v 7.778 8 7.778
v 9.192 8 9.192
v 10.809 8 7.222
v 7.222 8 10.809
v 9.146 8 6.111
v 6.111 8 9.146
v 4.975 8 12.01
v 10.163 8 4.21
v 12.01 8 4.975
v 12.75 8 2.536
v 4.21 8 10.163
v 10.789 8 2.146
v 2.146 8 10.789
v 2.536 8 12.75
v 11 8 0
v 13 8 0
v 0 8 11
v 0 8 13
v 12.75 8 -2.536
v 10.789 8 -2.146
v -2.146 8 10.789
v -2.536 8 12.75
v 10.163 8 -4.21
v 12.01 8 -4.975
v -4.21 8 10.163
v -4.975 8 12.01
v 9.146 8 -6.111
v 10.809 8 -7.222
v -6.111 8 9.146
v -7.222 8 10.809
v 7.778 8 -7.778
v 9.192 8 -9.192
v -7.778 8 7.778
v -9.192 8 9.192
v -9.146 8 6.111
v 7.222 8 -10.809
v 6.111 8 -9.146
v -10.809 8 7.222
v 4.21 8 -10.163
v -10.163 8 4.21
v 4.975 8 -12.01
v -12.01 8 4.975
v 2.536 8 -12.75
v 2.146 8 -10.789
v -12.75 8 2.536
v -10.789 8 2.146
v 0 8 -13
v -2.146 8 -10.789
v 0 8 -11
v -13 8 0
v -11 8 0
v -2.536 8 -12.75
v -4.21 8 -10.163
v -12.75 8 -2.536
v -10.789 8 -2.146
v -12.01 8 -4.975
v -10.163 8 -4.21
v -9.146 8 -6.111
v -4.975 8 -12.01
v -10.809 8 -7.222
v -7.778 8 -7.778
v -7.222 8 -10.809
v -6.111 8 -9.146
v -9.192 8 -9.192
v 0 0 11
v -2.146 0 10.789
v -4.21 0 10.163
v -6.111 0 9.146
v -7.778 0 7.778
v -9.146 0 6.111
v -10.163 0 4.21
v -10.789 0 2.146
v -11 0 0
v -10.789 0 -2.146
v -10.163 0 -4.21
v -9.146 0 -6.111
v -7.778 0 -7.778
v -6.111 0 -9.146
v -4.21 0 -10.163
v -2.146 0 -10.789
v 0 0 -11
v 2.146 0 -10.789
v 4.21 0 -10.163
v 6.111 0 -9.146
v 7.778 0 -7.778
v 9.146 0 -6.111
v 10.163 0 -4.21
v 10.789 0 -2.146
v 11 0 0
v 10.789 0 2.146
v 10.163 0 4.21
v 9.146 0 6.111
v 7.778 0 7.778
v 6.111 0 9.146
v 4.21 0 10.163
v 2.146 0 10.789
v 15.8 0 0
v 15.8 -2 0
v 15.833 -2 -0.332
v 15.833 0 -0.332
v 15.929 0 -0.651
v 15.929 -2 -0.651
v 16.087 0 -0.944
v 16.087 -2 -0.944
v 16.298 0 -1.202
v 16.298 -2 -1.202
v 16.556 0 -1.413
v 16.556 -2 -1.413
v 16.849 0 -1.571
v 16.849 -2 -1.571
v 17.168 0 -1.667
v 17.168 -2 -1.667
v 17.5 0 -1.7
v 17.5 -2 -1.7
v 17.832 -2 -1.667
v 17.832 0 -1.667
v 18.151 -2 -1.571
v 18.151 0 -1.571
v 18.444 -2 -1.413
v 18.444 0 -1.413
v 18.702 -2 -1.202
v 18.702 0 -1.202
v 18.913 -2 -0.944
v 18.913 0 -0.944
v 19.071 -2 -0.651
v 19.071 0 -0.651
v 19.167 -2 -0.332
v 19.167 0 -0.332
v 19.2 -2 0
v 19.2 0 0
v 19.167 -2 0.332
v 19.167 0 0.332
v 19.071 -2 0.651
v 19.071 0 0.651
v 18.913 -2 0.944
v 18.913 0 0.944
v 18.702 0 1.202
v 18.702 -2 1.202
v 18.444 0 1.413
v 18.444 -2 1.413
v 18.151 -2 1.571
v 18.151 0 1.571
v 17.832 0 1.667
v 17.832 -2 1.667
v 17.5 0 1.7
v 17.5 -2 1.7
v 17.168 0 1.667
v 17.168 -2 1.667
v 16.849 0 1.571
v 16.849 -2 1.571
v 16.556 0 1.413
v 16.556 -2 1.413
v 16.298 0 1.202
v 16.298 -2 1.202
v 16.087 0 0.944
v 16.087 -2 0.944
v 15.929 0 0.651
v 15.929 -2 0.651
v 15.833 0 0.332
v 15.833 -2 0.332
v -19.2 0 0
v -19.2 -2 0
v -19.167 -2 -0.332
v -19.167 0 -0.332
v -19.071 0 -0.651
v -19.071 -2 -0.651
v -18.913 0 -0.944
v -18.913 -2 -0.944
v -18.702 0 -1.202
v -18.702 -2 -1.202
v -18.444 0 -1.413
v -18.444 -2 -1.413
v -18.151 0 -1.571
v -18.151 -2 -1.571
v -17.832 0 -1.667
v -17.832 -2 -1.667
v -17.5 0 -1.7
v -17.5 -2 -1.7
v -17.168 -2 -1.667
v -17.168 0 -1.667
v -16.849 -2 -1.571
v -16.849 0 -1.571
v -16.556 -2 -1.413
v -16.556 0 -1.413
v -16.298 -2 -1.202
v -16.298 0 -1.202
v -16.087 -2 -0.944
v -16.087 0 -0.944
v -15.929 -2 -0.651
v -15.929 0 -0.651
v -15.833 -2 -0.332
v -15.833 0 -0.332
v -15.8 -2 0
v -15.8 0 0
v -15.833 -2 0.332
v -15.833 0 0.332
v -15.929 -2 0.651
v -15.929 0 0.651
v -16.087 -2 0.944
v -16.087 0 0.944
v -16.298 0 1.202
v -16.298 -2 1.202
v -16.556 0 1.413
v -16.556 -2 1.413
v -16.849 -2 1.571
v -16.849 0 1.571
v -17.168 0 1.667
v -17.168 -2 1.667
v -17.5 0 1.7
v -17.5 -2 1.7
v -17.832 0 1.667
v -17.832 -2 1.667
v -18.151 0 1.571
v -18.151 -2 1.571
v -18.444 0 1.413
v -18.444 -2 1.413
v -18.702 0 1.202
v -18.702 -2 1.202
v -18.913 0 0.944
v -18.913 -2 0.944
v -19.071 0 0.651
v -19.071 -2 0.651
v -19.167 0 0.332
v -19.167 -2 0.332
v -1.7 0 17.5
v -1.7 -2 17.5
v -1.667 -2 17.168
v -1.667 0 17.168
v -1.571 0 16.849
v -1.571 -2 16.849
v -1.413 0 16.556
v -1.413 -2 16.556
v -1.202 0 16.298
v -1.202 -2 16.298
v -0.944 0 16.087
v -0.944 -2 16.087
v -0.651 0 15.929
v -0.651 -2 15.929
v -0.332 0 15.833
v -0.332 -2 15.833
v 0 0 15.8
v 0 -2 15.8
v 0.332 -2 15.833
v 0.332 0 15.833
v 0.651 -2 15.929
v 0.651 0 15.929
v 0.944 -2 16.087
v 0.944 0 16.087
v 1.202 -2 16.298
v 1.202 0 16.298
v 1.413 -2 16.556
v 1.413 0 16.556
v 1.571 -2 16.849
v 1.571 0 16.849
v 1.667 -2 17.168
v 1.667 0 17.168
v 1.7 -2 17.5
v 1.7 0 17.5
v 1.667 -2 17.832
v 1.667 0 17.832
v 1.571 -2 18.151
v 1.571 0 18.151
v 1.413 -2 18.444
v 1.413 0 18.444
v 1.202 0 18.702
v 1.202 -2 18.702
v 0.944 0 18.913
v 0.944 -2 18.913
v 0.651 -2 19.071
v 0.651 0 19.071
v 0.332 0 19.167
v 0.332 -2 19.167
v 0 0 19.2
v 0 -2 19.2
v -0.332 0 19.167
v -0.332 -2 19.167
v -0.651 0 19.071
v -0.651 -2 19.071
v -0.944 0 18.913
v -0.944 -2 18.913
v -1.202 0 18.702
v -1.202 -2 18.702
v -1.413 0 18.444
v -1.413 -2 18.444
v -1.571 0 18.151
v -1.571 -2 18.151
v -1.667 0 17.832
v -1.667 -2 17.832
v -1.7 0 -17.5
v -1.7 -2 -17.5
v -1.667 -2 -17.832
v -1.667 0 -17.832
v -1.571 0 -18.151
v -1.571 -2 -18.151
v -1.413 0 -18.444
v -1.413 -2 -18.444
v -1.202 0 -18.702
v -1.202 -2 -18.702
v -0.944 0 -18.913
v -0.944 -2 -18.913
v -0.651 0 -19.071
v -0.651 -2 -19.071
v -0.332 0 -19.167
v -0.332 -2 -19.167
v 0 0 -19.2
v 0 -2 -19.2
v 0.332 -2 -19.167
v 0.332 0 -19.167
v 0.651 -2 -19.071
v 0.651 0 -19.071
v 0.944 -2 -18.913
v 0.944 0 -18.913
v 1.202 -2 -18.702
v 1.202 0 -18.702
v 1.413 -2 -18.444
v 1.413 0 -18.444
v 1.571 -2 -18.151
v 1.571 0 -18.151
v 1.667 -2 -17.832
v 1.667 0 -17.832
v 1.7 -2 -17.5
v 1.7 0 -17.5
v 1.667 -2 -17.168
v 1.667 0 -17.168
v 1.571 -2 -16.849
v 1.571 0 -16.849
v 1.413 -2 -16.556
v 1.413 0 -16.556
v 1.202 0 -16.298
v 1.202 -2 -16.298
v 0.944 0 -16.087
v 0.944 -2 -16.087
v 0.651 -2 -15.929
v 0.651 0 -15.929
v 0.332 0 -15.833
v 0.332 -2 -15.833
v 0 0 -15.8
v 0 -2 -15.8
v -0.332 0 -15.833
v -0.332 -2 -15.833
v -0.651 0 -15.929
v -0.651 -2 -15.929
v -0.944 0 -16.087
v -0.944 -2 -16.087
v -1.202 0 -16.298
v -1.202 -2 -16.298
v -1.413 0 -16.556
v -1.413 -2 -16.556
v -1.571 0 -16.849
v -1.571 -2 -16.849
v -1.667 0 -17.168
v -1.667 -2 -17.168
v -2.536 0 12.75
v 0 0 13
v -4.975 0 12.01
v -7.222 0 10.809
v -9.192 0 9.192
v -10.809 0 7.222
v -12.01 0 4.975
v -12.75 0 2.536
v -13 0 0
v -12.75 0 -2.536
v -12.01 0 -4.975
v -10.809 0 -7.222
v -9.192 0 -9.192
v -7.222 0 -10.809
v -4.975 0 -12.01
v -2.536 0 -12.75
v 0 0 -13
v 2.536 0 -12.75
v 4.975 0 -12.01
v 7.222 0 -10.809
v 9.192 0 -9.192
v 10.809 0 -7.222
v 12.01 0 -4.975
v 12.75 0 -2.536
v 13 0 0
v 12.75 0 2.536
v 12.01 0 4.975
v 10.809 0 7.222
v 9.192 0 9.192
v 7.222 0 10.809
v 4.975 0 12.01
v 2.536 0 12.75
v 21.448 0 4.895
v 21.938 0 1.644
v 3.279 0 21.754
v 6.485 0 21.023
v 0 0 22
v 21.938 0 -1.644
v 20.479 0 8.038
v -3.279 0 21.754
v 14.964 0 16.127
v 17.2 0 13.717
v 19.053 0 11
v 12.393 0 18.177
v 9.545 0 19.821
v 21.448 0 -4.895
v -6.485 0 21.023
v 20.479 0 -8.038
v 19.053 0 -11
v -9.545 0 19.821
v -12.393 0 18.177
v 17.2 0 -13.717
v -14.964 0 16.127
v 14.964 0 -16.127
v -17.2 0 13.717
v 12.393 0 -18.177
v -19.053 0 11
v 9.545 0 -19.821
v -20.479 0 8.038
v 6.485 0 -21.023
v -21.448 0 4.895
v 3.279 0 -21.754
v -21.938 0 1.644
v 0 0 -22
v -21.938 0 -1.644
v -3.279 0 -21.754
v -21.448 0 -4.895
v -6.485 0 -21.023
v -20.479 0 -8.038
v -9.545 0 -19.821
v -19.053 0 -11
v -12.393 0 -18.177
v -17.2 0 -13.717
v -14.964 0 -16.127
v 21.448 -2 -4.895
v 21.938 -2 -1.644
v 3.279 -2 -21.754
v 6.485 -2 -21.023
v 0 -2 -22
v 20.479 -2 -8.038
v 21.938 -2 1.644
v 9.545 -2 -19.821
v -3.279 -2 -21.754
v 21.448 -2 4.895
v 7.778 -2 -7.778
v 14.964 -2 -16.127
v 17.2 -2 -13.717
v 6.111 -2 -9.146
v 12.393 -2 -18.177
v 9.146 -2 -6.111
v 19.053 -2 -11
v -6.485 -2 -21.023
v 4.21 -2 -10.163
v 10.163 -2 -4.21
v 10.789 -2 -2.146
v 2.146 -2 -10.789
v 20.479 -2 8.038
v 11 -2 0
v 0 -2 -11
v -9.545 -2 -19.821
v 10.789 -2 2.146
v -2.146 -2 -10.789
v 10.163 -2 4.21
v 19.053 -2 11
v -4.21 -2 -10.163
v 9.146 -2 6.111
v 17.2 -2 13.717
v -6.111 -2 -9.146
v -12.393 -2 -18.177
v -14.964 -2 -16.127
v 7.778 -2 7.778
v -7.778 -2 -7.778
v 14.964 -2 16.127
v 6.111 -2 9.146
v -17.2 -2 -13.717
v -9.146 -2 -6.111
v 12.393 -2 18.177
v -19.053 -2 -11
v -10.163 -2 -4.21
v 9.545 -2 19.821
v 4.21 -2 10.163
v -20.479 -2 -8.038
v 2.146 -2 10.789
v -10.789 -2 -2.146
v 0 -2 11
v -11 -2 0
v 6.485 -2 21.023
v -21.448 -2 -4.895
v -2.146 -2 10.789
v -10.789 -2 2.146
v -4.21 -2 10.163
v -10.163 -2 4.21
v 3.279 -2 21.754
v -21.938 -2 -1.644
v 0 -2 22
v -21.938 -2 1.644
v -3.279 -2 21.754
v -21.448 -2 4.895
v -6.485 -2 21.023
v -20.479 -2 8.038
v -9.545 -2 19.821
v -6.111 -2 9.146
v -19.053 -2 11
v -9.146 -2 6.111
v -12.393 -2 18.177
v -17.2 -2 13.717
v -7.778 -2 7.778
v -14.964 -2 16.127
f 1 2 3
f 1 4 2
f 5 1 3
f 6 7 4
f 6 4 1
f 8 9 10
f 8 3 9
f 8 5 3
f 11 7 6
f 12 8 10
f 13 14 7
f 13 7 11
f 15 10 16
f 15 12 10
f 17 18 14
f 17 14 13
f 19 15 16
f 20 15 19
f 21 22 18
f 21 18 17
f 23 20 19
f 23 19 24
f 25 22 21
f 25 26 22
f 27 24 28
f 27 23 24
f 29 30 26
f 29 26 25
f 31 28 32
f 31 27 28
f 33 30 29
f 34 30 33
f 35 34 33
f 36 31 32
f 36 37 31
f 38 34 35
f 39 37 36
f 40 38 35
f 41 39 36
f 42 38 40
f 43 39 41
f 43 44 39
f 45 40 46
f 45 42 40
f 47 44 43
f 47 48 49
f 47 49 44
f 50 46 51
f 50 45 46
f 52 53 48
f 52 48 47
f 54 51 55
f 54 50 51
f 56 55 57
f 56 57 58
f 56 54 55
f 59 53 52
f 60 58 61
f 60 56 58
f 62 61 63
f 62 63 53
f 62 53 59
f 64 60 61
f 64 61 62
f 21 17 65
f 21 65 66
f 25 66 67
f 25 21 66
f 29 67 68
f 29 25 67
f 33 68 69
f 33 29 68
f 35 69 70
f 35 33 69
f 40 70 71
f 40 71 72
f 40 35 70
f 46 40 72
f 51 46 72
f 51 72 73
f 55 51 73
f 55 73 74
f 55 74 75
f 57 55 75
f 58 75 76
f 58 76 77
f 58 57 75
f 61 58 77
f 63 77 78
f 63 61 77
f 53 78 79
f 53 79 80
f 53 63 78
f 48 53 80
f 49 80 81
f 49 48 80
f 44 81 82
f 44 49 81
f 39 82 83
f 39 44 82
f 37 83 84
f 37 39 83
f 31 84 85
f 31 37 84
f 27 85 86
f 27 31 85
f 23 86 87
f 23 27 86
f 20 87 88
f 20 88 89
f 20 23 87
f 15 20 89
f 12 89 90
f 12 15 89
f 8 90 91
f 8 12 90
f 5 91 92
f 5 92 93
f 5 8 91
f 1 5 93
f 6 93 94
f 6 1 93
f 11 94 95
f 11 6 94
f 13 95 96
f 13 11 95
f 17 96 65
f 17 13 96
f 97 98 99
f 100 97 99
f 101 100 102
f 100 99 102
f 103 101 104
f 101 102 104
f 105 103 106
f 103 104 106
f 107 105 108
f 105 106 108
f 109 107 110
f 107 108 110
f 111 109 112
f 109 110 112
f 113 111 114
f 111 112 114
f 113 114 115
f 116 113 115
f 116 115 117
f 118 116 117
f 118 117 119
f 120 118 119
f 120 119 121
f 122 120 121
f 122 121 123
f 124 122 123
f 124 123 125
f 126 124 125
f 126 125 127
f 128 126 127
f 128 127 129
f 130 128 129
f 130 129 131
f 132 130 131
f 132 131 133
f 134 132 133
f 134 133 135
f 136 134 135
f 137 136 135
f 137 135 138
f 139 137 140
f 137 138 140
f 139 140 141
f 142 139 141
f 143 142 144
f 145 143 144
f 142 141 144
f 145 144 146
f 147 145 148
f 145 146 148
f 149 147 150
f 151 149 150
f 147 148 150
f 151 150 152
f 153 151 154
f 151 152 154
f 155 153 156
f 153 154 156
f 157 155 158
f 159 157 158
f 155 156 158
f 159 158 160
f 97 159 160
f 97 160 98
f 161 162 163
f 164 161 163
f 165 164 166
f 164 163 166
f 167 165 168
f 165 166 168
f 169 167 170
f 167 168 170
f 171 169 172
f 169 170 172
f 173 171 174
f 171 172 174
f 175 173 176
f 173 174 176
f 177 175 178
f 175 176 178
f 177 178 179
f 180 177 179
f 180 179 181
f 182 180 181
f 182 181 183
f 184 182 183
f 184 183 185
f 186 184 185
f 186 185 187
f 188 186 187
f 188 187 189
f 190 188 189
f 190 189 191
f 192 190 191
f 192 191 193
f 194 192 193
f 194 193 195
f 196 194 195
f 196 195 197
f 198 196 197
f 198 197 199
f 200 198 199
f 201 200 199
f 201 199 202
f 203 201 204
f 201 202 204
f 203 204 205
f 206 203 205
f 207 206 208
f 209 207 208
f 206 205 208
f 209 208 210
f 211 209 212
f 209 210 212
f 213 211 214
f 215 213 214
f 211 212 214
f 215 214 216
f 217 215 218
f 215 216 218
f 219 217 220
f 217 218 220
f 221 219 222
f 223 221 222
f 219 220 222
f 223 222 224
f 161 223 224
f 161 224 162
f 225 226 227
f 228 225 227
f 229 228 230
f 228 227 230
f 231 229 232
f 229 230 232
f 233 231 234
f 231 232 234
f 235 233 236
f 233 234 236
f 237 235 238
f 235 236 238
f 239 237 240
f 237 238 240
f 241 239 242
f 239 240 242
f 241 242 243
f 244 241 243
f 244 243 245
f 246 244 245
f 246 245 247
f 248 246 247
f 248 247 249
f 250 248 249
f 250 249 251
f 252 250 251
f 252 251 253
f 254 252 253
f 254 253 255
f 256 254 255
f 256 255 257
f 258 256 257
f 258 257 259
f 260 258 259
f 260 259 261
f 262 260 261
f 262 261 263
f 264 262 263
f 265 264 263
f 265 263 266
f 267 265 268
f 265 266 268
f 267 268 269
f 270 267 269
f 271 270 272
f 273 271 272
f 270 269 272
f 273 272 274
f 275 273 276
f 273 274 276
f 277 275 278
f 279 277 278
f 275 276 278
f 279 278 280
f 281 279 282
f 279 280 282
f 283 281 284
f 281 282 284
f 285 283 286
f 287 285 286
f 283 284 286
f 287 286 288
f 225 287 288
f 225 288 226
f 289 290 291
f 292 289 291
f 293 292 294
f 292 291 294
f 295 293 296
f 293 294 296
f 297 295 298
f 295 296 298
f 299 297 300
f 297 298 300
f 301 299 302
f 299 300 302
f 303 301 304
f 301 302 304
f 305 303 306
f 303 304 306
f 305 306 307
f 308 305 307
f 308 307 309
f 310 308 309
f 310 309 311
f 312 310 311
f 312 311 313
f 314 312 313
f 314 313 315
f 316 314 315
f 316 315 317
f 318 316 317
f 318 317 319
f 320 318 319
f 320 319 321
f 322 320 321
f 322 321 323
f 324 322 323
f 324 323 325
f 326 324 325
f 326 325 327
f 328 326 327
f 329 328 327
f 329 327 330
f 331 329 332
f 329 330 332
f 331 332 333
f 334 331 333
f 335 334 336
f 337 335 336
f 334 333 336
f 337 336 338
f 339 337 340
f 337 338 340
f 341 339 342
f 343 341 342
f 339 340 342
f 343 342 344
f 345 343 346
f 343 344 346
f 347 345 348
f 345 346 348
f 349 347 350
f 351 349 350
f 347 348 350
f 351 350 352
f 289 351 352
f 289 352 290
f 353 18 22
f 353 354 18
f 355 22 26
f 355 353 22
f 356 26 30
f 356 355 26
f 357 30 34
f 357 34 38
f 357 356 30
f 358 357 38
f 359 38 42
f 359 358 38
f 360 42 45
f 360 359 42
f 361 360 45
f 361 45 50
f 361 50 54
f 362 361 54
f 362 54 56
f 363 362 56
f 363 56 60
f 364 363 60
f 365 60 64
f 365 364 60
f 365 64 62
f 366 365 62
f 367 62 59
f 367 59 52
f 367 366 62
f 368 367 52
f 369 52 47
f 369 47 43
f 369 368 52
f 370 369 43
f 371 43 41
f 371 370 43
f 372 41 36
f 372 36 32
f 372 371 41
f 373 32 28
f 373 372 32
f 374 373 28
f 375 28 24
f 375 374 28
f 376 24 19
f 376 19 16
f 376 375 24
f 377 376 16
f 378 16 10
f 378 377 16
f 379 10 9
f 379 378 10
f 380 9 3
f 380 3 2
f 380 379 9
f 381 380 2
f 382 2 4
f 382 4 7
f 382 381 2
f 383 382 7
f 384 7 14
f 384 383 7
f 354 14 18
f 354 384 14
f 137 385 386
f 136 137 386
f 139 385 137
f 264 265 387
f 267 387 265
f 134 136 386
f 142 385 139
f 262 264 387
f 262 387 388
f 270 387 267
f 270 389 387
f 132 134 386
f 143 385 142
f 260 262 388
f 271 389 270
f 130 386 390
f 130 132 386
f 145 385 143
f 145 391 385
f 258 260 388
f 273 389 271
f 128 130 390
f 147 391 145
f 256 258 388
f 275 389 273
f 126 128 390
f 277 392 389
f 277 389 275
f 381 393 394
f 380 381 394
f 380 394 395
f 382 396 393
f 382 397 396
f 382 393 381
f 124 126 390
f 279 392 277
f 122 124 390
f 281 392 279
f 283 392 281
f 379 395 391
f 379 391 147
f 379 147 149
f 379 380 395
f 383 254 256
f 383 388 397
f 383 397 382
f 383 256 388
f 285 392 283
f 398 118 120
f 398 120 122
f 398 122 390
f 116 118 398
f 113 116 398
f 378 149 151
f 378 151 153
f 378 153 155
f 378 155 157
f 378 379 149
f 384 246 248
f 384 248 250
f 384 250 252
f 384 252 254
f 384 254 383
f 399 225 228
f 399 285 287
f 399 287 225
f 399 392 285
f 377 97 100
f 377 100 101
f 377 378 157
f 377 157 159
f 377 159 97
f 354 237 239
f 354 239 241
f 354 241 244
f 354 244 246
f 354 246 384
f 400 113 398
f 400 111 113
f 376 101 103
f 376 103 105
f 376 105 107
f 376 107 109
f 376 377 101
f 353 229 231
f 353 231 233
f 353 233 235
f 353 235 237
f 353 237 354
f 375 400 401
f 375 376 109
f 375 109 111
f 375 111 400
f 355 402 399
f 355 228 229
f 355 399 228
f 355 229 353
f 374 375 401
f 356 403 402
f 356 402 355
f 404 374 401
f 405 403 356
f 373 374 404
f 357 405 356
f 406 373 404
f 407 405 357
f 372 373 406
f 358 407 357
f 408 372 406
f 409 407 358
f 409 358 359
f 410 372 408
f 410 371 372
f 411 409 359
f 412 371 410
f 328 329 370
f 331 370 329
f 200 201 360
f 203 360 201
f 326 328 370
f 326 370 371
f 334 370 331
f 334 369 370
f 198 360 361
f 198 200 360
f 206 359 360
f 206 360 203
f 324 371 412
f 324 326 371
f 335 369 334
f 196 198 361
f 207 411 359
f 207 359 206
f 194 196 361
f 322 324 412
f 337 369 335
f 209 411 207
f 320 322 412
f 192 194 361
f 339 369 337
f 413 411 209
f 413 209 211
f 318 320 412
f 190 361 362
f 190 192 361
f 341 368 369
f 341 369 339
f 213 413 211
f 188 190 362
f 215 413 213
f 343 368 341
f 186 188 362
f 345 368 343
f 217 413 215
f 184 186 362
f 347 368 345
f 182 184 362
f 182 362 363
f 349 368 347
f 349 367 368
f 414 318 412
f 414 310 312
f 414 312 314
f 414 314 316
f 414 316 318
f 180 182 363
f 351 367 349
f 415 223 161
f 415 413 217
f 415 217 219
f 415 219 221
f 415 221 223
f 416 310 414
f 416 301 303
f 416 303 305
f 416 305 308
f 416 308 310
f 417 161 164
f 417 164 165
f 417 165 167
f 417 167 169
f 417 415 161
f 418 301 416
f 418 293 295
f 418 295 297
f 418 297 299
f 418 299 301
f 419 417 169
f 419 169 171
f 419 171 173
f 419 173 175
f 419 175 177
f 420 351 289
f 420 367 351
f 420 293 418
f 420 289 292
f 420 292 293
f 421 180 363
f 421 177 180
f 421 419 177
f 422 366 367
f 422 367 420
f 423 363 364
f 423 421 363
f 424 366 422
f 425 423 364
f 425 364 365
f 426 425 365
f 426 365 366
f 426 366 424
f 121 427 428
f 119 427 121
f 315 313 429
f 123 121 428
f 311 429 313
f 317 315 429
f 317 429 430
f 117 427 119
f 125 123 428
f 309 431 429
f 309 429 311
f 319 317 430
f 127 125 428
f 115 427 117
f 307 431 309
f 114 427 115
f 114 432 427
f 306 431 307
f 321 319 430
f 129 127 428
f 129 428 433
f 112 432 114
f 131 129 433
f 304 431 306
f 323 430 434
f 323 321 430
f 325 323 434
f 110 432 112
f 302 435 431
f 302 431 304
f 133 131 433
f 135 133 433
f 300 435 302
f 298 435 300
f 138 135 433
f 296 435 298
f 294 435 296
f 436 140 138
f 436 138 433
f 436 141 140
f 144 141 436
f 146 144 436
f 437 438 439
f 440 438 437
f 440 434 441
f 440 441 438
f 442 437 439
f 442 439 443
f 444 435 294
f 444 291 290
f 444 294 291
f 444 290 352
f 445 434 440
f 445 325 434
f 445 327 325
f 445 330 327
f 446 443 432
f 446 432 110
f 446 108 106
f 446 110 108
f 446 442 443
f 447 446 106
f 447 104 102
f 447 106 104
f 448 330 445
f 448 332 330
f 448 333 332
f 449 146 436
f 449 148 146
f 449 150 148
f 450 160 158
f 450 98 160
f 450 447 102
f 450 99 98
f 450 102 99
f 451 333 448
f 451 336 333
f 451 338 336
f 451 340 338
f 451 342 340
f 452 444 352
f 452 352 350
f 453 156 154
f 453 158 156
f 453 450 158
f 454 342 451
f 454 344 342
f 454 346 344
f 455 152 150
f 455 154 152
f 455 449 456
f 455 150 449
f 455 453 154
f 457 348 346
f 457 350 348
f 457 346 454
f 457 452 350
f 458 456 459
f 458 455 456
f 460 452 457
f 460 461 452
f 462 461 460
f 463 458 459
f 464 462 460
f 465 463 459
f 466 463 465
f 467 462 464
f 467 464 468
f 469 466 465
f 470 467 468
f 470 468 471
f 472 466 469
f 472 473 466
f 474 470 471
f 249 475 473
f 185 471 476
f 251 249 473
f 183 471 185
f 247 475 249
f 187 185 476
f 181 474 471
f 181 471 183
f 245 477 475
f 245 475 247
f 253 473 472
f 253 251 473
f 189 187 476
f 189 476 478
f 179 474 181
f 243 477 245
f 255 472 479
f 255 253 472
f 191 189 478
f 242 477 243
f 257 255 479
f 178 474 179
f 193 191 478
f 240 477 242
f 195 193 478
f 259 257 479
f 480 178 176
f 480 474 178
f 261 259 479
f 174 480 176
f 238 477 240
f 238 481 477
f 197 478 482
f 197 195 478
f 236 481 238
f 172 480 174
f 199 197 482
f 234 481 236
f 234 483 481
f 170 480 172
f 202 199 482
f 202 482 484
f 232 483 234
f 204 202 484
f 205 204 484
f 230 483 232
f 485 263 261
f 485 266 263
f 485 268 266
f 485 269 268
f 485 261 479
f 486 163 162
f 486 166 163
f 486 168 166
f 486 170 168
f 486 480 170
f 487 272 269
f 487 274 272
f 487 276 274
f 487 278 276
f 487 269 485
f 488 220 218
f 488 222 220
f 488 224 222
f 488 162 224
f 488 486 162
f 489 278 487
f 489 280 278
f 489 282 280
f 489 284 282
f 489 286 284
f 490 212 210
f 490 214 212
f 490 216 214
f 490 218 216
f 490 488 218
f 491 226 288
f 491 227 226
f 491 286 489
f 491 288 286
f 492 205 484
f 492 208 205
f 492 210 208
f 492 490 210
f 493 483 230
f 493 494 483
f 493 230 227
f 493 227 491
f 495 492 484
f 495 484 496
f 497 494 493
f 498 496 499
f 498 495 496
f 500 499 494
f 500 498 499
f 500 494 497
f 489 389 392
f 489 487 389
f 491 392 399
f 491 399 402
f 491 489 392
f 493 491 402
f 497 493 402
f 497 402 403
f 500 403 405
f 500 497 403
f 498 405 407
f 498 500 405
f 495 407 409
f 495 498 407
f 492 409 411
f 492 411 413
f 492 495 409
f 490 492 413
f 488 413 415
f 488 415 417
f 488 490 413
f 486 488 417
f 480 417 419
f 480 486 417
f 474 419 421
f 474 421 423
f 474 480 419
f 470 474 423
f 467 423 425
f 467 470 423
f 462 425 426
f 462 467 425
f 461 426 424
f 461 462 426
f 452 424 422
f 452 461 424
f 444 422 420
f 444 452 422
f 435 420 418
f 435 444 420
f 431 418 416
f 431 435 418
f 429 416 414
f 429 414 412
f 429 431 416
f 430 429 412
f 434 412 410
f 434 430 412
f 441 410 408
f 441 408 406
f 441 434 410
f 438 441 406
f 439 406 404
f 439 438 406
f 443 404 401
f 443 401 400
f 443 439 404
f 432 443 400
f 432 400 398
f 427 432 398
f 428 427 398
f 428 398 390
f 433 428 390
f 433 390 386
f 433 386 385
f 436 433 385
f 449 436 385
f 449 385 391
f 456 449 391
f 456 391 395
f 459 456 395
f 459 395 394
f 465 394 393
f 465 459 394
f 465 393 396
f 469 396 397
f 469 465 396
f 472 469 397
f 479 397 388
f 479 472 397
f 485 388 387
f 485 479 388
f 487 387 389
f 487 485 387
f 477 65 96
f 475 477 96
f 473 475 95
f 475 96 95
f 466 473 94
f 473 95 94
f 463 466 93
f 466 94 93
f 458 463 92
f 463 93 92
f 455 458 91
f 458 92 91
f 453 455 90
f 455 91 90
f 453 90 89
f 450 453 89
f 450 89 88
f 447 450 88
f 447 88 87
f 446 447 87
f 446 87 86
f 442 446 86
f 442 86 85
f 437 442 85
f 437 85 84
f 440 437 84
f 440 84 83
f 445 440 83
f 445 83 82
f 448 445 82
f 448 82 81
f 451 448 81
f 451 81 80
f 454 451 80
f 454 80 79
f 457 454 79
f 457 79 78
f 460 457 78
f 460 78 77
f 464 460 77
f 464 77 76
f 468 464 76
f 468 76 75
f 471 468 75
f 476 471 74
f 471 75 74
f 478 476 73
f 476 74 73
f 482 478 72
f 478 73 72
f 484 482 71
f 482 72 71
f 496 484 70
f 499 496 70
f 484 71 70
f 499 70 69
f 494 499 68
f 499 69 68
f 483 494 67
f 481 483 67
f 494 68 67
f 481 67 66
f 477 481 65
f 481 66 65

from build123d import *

# Parameters (mm, degrees)
SKETCH2_R            = 11
CUT_EXTRUDE1_DEPTH   = 33.124756808
M3_CLEARANCE_HOLE1_D = 3.4


with BuildPart() as part:
    # Sketch1 → Revolve1 (revolve)
    with BuildSketch(Plane.XY, mode=Mode.PRIVATE) as revolve1_sk:
        Polygon((9, 0), (11, 0), (11, 8), (13, 8), (13, 0), (22, 0), (22, -2), (9, -2), align=None)
    revolve(revolve1_sk.sketch.rotate(Axis((0, 17.954019247, 0), (0, -1, 0)), 90), axis=Axis((0, 17.954019247, 0), (0, -1, 0)))

    # Sketch2 → Cut-Extrude1 (cut, through all)
    with BuildSketch(Plane(origin=(0, 0, 0), x_dir=(1, 0, 0), z_dir=(0, 1, 0))):
        with Locations(Location((0, 0, 0), (0, 0, 270))):
            Circle(SKETCH2_R)
    extrude(amount=-CUT_EXTRUDE1_DEPTH, mode=Mode.SUBTRACT)

    # M3 Clearance Hole1 (through all)
    with Locations(Plane(origin=(0, 0, 0), x_dir=(1, 0, 0), z_dir=(0, 1, 0))):
        with Locations((0, 17.5), (17.5, 0), (0, -17.5), (-17.5, 0)):
            Hole(M3_CLEARANCE_HOLE1_D / 2)


solid = part.part
